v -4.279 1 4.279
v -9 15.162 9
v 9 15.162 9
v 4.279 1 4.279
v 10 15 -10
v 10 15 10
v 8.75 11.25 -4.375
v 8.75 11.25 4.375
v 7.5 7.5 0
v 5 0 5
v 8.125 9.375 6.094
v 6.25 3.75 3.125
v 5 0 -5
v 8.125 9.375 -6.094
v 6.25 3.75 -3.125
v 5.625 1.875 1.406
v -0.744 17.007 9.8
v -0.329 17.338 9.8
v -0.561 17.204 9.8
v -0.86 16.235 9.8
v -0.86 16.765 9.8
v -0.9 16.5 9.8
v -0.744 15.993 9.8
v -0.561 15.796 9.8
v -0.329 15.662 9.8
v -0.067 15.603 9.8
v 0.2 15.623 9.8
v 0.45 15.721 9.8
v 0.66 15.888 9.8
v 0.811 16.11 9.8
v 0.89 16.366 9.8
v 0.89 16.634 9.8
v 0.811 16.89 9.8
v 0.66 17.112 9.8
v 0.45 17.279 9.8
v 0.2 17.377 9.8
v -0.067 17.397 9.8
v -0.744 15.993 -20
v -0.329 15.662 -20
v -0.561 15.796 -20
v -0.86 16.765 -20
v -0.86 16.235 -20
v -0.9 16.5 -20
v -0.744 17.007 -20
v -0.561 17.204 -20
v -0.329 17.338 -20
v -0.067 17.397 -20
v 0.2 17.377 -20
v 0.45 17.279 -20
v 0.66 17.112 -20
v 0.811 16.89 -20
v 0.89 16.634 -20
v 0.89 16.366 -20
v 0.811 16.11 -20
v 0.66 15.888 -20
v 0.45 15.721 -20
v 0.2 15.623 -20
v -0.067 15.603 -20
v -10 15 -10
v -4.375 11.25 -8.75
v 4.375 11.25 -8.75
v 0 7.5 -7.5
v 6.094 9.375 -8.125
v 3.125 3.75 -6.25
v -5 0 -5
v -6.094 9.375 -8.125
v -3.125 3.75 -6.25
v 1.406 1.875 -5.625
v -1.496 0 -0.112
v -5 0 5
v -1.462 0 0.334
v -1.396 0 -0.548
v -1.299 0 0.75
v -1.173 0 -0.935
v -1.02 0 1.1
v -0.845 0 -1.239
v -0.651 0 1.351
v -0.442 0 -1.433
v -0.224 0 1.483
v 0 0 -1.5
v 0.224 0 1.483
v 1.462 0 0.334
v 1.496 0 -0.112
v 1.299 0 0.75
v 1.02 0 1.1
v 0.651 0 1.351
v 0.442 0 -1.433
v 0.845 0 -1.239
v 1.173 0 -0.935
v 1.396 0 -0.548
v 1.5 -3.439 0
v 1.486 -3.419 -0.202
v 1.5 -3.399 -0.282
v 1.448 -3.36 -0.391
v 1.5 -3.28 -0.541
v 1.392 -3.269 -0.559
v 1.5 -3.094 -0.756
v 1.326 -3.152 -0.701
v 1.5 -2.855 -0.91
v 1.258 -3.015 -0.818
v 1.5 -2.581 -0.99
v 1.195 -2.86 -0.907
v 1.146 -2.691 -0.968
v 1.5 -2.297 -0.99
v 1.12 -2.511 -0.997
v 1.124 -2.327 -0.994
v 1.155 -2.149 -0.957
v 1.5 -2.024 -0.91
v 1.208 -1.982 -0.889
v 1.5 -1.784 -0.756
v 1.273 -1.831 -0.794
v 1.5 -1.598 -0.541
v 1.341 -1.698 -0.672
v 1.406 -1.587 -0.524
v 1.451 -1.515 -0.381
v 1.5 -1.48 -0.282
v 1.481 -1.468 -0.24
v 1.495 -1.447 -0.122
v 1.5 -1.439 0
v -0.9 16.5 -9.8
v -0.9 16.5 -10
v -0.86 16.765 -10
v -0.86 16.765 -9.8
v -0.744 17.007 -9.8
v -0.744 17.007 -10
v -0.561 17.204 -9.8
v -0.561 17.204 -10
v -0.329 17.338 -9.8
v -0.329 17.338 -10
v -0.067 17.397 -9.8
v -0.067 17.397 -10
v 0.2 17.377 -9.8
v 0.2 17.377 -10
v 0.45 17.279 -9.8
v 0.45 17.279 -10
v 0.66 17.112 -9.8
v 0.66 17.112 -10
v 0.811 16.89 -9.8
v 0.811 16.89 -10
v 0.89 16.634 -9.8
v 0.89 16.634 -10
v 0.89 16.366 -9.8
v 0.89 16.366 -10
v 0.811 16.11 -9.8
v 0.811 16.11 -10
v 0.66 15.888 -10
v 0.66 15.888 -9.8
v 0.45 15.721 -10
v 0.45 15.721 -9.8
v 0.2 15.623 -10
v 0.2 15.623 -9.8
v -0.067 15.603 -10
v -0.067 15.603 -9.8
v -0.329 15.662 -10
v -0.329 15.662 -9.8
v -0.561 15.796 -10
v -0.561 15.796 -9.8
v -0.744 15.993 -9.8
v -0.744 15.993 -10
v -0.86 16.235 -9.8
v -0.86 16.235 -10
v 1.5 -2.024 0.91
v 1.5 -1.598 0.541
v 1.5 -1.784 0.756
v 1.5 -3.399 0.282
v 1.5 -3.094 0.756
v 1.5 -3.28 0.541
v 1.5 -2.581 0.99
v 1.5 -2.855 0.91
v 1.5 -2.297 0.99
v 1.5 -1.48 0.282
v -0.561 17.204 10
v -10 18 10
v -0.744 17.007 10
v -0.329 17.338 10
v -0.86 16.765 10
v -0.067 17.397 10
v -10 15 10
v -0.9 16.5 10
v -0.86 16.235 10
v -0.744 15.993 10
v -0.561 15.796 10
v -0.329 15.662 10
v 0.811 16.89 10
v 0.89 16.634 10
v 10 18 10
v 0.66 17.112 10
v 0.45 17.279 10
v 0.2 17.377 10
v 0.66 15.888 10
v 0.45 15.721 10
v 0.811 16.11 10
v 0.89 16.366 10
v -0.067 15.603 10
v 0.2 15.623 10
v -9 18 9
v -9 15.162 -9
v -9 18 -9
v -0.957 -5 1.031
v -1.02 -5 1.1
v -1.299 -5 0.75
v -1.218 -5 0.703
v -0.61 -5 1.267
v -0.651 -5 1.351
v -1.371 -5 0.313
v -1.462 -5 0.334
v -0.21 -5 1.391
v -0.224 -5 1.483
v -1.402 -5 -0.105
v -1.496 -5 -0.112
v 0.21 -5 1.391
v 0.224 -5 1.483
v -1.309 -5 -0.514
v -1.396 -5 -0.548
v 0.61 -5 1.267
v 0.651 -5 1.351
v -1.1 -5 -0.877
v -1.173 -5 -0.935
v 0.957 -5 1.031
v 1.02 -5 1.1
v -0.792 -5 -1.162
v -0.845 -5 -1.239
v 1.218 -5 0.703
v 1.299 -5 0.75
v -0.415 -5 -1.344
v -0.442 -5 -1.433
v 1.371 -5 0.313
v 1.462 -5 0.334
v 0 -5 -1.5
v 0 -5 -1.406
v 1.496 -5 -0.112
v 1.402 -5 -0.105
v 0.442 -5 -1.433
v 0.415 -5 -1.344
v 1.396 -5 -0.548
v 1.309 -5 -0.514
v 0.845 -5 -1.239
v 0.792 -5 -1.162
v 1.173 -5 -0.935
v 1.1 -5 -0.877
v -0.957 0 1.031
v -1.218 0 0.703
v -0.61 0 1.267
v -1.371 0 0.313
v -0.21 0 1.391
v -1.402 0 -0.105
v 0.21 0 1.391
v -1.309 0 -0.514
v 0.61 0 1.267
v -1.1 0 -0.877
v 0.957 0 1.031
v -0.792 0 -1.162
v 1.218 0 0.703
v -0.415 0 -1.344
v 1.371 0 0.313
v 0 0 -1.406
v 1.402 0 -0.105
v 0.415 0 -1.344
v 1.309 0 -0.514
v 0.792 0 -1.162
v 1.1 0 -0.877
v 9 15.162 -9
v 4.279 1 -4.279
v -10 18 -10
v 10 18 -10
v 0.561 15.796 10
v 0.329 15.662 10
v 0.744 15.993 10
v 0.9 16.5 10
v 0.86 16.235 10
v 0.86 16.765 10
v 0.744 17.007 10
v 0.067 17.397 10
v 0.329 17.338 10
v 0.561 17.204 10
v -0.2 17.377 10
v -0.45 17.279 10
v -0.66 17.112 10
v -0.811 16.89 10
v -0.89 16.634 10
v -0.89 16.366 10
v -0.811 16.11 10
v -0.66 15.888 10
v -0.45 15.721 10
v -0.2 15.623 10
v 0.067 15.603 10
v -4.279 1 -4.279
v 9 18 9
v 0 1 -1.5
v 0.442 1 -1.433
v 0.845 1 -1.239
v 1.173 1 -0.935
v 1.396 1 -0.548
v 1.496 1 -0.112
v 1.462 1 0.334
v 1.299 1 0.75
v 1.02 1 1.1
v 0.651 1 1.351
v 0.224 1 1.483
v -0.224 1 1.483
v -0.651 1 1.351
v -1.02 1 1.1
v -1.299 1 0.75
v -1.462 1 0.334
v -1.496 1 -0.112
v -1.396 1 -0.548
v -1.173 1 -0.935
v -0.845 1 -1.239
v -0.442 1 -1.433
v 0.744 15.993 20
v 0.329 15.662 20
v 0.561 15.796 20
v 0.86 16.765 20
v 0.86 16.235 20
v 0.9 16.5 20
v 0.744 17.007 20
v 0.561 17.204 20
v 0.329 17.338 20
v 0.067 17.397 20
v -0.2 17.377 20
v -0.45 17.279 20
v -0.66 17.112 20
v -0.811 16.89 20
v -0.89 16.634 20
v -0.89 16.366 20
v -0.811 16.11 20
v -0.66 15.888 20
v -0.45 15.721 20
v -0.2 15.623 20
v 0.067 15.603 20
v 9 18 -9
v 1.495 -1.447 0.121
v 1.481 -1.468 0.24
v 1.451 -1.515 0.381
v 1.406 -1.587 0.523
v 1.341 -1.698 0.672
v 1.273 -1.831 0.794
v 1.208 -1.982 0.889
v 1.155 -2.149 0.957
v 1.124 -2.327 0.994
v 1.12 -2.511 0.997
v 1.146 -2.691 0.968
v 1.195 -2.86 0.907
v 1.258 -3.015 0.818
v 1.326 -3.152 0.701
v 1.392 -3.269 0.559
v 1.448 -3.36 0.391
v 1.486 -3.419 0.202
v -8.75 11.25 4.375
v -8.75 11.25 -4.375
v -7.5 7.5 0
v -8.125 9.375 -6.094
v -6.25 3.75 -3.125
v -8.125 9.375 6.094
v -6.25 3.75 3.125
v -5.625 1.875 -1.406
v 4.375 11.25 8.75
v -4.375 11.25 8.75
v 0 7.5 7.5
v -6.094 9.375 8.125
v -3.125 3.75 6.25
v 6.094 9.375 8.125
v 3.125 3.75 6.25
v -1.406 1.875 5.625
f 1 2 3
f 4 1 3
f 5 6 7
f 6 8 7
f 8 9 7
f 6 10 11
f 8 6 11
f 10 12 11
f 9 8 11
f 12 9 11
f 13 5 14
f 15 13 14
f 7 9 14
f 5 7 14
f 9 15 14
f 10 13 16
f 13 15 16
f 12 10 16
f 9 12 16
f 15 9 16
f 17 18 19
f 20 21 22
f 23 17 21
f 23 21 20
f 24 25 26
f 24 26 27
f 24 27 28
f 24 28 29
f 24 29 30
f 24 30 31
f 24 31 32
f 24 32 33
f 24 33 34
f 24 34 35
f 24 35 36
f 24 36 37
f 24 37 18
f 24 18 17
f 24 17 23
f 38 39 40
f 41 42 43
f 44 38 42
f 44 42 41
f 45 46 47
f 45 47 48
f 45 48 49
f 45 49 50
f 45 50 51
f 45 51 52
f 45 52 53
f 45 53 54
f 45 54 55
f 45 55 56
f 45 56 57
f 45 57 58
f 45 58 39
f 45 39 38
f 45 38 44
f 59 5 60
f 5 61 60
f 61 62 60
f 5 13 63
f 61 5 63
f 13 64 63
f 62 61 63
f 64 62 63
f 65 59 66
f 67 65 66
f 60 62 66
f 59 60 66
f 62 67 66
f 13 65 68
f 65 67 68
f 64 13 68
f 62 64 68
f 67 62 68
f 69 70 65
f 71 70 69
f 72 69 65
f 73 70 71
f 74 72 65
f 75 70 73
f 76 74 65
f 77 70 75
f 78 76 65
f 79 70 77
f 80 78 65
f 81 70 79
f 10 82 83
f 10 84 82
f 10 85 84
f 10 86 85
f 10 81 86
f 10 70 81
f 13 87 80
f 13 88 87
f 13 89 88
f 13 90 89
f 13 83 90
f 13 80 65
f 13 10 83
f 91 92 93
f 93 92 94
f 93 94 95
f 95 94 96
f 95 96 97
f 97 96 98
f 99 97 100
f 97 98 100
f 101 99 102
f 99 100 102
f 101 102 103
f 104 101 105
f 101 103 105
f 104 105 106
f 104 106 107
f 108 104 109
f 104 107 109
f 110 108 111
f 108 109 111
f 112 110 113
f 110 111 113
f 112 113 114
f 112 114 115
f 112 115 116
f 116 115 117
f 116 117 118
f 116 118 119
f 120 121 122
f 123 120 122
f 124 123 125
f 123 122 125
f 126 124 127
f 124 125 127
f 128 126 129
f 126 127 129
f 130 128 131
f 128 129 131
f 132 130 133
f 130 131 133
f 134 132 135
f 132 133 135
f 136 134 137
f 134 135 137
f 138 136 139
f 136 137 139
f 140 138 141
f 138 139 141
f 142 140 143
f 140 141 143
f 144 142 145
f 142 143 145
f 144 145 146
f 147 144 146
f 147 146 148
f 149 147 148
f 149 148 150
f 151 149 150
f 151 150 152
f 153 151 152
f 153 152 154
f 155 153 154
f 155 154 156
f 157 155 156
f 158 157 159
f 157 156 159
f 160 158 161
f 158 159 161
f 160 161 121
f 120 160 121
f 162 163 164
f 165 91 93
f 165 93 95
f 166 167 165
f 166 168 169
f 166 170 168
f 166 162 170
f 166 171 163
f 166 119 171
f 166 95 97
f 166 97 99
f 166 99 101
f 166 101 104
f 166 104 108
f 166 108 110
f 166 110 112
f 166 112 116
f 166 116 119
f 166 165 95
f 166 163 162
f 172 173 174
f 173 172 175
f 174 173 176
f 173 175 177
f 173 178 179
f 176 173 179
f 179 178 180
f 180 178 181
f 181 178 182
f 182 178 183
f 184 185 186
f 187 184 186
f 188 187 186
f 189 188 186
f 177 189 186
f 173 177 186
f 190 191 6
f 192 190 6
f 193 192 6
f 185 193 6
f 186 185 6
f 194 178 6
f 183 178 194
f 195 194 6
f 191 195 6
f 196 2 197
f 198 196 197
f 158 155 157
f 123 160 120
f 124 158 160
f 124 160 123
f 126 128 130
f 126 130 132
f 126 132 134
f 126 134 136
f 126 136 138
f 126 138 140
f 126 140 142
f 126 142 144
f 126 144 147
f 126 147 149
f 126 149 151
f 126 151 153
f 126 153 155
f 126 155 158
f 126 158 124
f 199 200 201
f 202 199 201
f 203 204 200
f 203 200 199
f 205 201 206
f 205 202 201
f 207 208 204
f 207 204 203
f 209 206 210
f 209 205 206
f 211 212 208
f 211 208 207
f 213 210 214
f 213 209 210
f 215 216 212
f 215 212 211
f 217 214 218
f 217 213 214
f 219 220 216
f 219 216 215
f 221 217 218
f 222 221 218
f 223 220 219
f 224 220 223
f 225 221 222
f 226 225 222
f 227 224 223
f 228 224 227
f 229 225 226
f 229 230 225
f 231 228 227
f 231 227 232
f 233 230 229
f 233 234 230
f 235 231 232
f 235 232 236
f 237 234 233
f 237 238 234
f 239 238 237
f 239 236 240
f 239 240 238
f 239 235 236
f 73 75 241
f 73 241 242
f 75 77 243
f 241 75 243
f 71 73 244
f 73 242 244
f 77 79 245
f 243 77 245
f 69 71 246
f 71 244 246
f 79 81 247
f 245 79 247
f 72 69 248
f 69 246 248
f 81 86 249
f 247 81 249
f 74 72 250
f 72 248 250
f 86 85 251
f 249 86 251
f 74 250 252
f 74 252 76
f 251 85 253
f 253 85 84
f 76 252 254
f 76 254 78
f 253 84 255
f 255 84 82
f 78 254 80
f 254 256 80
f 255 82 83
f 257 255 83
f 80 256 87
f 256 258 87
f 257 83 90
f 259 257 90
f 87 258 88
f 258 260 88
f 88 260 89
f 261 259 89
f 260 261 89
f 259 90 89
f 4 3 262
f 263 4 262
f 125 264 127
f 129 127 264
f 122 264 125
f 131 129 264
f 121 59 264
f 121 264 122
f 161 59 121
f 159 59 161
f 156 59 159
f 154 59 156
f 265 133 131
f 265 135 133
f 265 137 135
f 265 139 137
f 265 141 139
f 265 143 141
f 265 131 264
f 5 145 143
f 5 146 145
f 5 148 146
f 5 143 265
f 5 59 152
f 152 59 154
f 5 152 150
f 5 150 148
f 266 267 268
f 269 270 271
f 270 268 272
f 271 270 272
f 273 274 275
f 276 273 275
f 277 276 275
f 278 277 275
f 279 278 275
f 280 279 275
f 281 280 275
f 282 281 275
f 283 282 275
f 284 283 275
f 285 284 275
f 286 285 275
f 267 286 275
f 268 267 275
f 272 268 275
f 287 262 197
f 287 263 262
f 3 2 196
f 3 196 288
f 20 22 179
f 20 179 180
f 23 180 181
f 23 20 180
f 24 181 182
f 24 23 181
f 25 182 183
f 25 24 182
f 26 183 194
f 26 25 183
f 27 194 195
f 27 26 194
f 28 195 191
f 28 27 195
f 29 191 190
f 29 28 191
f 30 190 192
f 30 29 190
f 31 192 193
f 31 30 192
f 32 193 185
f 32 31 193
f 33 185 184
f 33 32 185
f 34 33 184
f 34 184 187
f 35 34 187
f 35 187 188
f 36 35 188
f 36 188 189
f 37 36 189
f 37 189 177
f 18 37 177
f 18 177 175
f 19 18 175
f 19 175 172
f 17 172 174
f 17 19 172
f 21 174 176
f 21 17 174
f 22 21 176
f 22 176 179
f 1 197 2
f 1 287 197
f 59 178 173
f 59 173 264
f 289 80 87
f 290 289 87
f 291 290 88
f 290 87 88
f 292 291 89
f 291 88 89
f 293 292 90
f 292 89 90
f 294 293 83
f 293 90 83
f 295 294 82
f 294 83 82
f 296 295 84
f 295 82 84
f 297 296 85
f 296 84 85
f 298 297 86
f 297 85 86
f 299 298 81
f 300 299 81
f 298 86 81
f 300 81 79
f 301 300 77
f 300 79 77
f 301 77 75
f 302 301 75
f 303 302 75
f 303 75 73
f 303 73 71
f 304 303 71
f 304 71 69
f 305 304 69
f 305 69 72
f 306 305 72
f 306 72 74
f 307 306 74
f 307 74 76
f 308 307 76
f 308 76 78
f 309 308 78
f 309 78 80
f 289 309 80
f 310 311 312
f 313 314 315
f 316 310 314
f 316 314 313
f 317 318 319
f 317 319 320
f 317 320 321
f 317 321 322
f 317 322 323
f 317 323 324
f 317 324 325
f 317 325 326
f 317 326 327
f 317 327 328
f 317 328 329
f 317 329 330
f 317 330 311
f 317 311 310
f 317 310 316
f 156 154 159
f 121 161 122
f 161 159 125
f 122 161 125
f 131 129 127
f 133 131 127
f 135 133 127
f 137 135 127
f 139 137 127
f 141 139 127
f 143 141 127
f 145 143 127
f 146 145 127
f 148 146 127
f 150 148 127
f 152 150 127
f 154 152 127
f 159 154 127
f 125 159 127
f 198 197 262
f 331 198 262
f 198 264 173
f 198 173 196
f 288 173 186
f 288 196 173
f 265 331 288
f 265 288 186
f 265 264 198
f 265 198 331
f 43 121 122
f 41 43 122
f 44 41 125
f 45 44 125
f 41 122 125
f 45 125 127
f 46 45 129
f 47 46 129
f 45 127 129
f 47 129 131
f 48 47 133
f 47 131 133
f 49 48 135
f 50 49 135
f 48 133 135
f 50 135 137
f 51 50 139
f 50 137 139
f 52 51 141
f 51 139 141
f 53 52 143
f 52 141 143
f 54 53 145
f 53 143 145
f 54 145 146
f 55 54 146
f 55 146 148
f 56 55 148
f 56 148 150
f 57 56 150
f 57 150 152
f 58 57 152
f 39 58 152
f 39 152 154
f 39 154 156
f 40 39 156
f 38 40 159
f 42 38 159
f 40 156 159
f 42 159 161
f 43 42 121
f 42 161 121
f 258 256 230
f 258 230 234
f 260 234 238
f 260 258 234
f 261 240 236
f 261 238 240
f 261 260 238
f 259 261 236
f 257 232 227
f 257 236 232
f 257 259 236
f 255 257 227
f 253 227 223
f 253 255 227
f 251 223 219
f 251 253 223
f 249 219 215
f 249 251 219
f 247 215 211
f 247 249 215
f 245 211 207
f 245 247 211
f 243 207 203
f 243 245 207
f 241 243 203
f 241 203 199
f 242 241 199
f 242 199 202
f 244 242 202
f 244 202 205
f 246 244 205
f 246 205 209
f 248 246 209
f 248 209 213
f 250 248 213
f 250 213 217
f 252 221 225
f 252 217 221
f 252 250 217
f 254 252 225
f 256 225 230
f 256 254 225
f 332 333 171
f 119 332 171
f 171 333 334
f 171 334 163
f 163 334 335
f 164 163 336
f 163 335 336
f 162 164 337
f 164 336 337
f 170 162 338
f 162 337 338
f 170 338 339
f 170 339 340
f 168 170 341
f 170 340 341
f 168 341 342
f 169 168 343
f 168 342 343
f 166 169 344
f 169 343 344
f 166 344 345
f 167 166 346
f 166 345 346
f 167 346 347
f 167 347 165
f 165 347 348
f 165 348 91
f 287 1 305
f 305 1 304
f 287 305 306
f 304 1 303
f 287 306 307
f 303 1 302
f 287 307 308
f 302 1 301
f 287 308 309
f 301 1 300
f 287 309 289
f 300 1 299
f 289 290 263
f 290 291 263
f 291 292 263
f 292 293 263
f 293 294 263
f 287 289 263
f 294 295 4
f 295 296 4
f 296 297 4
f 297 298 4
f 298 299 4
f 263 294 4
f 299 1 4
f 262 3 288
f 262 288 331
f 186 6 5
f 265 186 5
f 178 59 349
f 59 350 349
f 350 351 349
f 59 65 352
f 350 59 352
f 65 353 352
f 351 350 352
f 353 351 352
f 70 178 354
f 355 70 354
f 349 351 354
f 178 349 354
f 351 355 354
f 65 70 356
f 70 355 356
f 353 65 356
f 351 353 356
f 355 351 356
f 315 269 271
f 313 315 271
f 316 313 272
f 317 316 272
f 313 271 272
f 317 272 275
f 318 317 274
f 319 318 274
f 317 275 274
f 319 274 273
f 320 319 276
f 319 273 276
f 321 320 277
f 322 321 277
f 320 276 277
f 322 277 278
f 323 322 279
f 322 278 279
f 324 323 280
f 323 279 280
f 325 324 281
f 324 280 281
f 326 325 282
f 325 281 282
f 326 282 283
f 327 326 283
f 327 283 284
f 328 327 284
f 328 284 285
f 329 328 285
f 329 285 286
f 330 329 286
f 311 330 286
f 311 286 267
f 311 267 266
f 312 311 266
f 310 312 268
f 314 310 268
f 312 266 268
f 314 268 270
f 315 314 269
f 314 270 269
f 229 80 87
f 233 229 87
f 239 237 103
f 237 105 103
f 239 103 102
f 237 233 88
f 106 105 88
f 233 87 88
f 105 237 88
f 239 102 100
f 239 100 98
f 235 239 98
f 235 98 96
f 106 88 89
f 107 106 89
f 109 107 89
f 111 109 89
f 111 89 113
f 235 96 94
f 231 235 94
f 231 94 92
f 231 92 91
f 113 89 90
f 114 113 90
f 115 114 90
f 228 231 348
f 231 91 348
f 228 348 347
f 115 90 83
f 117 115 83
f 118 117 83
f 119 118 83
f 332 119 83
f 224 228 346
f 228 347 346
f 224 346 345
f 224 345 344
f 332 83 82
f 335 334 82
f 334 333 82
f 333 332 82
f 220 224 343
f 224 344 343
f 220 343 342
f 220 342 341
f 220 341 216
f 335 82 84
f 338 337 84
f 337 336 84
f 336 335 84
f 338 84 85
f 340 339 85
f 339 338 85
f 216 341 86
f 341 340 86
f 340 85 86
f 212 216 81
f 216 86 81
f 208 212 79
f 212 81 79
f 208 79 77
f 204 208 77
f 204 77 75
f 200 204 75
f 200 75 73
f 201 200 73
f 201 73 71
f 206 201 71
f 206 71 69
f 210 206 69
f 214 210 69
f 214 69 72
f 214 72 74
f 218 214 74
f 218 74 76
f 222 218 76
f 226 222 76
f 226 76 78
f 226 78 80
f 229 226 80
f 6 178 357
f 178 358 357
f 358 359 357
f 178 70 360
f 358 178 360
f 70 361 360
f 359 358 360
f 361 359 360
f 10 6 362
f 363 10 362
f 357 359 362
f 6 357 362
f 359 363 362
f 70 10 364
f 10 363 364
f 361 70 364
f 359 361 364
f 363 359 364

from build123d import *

# Parameters (mm, degrees)
CROQUIS3_W                 = 20
CROQUIS3_H                 = 20
SALIENTE_EXTRUIR1_DEPTH    = 3
VACIADO2_T                 = -1
CROQUIS4_R                 = 1.5
CORTAR_EXTRUIR1_DEPTH      = 3
CROQUIS5_R                 = 1.5
SALIENTE_EXTRUIR2_DEPTH    = 5
CROQUIS6_R                 = 1.355898714
CORTAR_EXTRUIR2_DEPTH      = 15
CROQUIS7_R                 = 1
SALIENTE_EXTRUIR4_DEPTH    = 1.5
CORTAR_EXTRUIR3_DEPTH      = 31.5
CORTAR_EXTRUIR3_DEPTH_BACK = 1.5
CROQUIS10_R                = 1.406391719
CROQUIS11_R                = 0.9
CORTAR_EXTRUIR4_DEPTH      = 0.2
CORTAR_EXTRUIR5_START      = -0.2
CROQUIS12_R                = 0.9
CORTAR_EXTRUIR5_DEPTH      = 0.2
CROQUIS15_R                = 0.9
SALIENTE_EXTRUIR6_DEPTH    = 10
CROQUIS16_R                = 0.9
SALIENTE_EXTRUIR7_DEPTH    = 10


with BuildPart() as part:
    # Croquis2 → Recubrir1 section 0
    with BuildSketch(Plane(origin=(0, 15, 0), x_dir=(1, 0, 0), z_dir=(0, 1, 0))):
        with BuildLine():
            Line((-10, -10), (10, -10))
            Line((10, -10), (10, 10))
            Line((10, 10), (-10, 10))
            Line((-10, 10), (-10, -10))
        make_face()
    # Croquis1 → Recubrir1 section 1
    with BuildSketch(Plane(origin=(0, 0, 0), x_dir=(1, 0, 0), z_dir=(0, 1, 0))):
        with BuildLine():
            Line((-5, -5), (5, -5))
            Line((5, -5), (5, 5))
            Line((5, 5), (-5, 5))
            Line((-5, 5), (-5, -5))
        make_face()
    loft()

    # Croquis3 → Saliente-Extruir1 (add)
    with BuildSketch(Plane(origin=(0, 15, 0), x_dir=(1, 0, 0), z_dir=(0, 1, 0))):
        Rectangle(CROQUIS3_W, CROQUIS3_H)
    extrude(amount=SALIENTE_EXTRUIR1_DEPTH)

    # Vaciado2
    vaciado2_openings = [part.faces().sort_by_distance(p)[0] for p in [
        (0, 18, 0),
    ]]
    offset(amount=VACIADO2_T, openings=vaciado2_openings, kind=Kind.INTERSECTION)

    # Croquis4 → Cortar-Extruir1 (cut)
    with BuildSketch(Plane(origin=(0, 0, 0), x_dir=(-1, 0, 0), z_dir=(0, -1, 0))):
        with Locations(Location((0, 0, 0), (0, 0, 90))):
            Circle(CROQUIS4_R)
    extrude(amount=-CORTAR_EXTRUIR1_DEPTH, mode=Mode.SUBTRACT)

    # Croquis11 → Cortar-Extruir4 (cut)
    with BuildSketch(Plane(origin=(0, 0, -10), x_dir=(-1, 0, 0), z_dir=(0, 0, -1))):
        with Locations((0, 16.5)):
            Circle(CROQUIS11_R)
    extrude(amount=-CORTAR_EXTRUIR4_DEPTH, mode=Mode.SUBTRACT)

    # Croquis12 → Cortar-Extruir5 (cut)
    with BuildSketch(Plane.XY.offset(10).offset(CORTAR_EXTRUIR5_START)):
        with Locations(Location((0, 16.5, 0), (0, 0, 180))):
            Circle(CROQUIS12_R)
    extrude(amount=CORTAR_EXTRUIR5_DEPTH, mode=Mode.SUBTRACT)


with BuildPart() as body_2:
    # Croquis5 → Saliente-Extruir2 (new body)
    with BuildSketch(Plane(origin=(0, 0, 0), x_dir=(-1, 0, 0), z_dir=(0, -1, 0))):
        with Locations(Location((0, 0, 0), (0, 0, 90))):
            Circle(CROQUIS5_R)
    extrude(amount=SALIENTE_EXTRUIR2_DEPTH)

    # Croquis6 → Cortar-Extruir2 (cut)
    with BuildSketch(Plane(origin=(0, -5, 0), x_dir=(-1, 0, 0), z_dir=(0, -1, 0))):
        with Locations(Location((0, 0, 0), (0, 0, 90))):
            Circle(CROQUIS6_R)
    extrude(amount=-CORTAR_EXTRUIR2_DEPTH, mode=Mode.SUBTRACT)

    # Croquis7 → Saliente-Extruir4 (add)
    with BuildSketch(Plane(origin=(0, 0, 0), x_dir=(0, 0, -1), z_dir=(1, 0, 0))):
        with Locations(Location((0, -2.4391778, 0), (0, 0, 180))):
            Circle(CROQUIS7_R)
    extrude(amount=SALIENTE_EXTRUIR4_DEPTH)

    # Croquis10 → Cortar-Extruir3 (cut, two sides: drawn at the far end of the back side and taken through both)
    with BuildSketch(Plane(origin=(0, 0, 0), x_dir=(-1, 0, 0), z_dir=(0, -1, 0)).offset(-CORTAR_EXTRUIR3_DEPTH_BACK)):
        with Locations(Location((0, 0, 0), (0, 0, 90))):
            Circle(CROQUIS10_R)
    extrude(amount=CORTAR_EXTRUIR3_DEPTH + CORTAR_EXTRUIR3_DEPTH_BACK, mode=Mode.SUBTRACT)


with BuildPart() as body_3:
    # Croquis15 → Saliente-Extruir6 (new body)
    with BuildSketch(Plane(origin=(0, 0, -10), x_dir=(-1, 0, 0), z_dir=(0, 0, -1))):
        with Locations((0, 16.5)):
            Circle(CROQUIS15_R)
    extrude(amount=SALIENTE_EXTRUIR6_DEPTH)


with BuildPart() as body_4:
    # Croquis16 → Saliente-Extruir7 (new body)
    with BuildSketch(Plane.XY.offset(10)):
        with Locations((0, 16.5)):
            Circle(CROQUIS16_R)
    extrude(amount=SALIENTE_EXTRUIR7_DEPTH)


solid = Compound([part.part, body_2.part, body_3.part, body_4.part])
